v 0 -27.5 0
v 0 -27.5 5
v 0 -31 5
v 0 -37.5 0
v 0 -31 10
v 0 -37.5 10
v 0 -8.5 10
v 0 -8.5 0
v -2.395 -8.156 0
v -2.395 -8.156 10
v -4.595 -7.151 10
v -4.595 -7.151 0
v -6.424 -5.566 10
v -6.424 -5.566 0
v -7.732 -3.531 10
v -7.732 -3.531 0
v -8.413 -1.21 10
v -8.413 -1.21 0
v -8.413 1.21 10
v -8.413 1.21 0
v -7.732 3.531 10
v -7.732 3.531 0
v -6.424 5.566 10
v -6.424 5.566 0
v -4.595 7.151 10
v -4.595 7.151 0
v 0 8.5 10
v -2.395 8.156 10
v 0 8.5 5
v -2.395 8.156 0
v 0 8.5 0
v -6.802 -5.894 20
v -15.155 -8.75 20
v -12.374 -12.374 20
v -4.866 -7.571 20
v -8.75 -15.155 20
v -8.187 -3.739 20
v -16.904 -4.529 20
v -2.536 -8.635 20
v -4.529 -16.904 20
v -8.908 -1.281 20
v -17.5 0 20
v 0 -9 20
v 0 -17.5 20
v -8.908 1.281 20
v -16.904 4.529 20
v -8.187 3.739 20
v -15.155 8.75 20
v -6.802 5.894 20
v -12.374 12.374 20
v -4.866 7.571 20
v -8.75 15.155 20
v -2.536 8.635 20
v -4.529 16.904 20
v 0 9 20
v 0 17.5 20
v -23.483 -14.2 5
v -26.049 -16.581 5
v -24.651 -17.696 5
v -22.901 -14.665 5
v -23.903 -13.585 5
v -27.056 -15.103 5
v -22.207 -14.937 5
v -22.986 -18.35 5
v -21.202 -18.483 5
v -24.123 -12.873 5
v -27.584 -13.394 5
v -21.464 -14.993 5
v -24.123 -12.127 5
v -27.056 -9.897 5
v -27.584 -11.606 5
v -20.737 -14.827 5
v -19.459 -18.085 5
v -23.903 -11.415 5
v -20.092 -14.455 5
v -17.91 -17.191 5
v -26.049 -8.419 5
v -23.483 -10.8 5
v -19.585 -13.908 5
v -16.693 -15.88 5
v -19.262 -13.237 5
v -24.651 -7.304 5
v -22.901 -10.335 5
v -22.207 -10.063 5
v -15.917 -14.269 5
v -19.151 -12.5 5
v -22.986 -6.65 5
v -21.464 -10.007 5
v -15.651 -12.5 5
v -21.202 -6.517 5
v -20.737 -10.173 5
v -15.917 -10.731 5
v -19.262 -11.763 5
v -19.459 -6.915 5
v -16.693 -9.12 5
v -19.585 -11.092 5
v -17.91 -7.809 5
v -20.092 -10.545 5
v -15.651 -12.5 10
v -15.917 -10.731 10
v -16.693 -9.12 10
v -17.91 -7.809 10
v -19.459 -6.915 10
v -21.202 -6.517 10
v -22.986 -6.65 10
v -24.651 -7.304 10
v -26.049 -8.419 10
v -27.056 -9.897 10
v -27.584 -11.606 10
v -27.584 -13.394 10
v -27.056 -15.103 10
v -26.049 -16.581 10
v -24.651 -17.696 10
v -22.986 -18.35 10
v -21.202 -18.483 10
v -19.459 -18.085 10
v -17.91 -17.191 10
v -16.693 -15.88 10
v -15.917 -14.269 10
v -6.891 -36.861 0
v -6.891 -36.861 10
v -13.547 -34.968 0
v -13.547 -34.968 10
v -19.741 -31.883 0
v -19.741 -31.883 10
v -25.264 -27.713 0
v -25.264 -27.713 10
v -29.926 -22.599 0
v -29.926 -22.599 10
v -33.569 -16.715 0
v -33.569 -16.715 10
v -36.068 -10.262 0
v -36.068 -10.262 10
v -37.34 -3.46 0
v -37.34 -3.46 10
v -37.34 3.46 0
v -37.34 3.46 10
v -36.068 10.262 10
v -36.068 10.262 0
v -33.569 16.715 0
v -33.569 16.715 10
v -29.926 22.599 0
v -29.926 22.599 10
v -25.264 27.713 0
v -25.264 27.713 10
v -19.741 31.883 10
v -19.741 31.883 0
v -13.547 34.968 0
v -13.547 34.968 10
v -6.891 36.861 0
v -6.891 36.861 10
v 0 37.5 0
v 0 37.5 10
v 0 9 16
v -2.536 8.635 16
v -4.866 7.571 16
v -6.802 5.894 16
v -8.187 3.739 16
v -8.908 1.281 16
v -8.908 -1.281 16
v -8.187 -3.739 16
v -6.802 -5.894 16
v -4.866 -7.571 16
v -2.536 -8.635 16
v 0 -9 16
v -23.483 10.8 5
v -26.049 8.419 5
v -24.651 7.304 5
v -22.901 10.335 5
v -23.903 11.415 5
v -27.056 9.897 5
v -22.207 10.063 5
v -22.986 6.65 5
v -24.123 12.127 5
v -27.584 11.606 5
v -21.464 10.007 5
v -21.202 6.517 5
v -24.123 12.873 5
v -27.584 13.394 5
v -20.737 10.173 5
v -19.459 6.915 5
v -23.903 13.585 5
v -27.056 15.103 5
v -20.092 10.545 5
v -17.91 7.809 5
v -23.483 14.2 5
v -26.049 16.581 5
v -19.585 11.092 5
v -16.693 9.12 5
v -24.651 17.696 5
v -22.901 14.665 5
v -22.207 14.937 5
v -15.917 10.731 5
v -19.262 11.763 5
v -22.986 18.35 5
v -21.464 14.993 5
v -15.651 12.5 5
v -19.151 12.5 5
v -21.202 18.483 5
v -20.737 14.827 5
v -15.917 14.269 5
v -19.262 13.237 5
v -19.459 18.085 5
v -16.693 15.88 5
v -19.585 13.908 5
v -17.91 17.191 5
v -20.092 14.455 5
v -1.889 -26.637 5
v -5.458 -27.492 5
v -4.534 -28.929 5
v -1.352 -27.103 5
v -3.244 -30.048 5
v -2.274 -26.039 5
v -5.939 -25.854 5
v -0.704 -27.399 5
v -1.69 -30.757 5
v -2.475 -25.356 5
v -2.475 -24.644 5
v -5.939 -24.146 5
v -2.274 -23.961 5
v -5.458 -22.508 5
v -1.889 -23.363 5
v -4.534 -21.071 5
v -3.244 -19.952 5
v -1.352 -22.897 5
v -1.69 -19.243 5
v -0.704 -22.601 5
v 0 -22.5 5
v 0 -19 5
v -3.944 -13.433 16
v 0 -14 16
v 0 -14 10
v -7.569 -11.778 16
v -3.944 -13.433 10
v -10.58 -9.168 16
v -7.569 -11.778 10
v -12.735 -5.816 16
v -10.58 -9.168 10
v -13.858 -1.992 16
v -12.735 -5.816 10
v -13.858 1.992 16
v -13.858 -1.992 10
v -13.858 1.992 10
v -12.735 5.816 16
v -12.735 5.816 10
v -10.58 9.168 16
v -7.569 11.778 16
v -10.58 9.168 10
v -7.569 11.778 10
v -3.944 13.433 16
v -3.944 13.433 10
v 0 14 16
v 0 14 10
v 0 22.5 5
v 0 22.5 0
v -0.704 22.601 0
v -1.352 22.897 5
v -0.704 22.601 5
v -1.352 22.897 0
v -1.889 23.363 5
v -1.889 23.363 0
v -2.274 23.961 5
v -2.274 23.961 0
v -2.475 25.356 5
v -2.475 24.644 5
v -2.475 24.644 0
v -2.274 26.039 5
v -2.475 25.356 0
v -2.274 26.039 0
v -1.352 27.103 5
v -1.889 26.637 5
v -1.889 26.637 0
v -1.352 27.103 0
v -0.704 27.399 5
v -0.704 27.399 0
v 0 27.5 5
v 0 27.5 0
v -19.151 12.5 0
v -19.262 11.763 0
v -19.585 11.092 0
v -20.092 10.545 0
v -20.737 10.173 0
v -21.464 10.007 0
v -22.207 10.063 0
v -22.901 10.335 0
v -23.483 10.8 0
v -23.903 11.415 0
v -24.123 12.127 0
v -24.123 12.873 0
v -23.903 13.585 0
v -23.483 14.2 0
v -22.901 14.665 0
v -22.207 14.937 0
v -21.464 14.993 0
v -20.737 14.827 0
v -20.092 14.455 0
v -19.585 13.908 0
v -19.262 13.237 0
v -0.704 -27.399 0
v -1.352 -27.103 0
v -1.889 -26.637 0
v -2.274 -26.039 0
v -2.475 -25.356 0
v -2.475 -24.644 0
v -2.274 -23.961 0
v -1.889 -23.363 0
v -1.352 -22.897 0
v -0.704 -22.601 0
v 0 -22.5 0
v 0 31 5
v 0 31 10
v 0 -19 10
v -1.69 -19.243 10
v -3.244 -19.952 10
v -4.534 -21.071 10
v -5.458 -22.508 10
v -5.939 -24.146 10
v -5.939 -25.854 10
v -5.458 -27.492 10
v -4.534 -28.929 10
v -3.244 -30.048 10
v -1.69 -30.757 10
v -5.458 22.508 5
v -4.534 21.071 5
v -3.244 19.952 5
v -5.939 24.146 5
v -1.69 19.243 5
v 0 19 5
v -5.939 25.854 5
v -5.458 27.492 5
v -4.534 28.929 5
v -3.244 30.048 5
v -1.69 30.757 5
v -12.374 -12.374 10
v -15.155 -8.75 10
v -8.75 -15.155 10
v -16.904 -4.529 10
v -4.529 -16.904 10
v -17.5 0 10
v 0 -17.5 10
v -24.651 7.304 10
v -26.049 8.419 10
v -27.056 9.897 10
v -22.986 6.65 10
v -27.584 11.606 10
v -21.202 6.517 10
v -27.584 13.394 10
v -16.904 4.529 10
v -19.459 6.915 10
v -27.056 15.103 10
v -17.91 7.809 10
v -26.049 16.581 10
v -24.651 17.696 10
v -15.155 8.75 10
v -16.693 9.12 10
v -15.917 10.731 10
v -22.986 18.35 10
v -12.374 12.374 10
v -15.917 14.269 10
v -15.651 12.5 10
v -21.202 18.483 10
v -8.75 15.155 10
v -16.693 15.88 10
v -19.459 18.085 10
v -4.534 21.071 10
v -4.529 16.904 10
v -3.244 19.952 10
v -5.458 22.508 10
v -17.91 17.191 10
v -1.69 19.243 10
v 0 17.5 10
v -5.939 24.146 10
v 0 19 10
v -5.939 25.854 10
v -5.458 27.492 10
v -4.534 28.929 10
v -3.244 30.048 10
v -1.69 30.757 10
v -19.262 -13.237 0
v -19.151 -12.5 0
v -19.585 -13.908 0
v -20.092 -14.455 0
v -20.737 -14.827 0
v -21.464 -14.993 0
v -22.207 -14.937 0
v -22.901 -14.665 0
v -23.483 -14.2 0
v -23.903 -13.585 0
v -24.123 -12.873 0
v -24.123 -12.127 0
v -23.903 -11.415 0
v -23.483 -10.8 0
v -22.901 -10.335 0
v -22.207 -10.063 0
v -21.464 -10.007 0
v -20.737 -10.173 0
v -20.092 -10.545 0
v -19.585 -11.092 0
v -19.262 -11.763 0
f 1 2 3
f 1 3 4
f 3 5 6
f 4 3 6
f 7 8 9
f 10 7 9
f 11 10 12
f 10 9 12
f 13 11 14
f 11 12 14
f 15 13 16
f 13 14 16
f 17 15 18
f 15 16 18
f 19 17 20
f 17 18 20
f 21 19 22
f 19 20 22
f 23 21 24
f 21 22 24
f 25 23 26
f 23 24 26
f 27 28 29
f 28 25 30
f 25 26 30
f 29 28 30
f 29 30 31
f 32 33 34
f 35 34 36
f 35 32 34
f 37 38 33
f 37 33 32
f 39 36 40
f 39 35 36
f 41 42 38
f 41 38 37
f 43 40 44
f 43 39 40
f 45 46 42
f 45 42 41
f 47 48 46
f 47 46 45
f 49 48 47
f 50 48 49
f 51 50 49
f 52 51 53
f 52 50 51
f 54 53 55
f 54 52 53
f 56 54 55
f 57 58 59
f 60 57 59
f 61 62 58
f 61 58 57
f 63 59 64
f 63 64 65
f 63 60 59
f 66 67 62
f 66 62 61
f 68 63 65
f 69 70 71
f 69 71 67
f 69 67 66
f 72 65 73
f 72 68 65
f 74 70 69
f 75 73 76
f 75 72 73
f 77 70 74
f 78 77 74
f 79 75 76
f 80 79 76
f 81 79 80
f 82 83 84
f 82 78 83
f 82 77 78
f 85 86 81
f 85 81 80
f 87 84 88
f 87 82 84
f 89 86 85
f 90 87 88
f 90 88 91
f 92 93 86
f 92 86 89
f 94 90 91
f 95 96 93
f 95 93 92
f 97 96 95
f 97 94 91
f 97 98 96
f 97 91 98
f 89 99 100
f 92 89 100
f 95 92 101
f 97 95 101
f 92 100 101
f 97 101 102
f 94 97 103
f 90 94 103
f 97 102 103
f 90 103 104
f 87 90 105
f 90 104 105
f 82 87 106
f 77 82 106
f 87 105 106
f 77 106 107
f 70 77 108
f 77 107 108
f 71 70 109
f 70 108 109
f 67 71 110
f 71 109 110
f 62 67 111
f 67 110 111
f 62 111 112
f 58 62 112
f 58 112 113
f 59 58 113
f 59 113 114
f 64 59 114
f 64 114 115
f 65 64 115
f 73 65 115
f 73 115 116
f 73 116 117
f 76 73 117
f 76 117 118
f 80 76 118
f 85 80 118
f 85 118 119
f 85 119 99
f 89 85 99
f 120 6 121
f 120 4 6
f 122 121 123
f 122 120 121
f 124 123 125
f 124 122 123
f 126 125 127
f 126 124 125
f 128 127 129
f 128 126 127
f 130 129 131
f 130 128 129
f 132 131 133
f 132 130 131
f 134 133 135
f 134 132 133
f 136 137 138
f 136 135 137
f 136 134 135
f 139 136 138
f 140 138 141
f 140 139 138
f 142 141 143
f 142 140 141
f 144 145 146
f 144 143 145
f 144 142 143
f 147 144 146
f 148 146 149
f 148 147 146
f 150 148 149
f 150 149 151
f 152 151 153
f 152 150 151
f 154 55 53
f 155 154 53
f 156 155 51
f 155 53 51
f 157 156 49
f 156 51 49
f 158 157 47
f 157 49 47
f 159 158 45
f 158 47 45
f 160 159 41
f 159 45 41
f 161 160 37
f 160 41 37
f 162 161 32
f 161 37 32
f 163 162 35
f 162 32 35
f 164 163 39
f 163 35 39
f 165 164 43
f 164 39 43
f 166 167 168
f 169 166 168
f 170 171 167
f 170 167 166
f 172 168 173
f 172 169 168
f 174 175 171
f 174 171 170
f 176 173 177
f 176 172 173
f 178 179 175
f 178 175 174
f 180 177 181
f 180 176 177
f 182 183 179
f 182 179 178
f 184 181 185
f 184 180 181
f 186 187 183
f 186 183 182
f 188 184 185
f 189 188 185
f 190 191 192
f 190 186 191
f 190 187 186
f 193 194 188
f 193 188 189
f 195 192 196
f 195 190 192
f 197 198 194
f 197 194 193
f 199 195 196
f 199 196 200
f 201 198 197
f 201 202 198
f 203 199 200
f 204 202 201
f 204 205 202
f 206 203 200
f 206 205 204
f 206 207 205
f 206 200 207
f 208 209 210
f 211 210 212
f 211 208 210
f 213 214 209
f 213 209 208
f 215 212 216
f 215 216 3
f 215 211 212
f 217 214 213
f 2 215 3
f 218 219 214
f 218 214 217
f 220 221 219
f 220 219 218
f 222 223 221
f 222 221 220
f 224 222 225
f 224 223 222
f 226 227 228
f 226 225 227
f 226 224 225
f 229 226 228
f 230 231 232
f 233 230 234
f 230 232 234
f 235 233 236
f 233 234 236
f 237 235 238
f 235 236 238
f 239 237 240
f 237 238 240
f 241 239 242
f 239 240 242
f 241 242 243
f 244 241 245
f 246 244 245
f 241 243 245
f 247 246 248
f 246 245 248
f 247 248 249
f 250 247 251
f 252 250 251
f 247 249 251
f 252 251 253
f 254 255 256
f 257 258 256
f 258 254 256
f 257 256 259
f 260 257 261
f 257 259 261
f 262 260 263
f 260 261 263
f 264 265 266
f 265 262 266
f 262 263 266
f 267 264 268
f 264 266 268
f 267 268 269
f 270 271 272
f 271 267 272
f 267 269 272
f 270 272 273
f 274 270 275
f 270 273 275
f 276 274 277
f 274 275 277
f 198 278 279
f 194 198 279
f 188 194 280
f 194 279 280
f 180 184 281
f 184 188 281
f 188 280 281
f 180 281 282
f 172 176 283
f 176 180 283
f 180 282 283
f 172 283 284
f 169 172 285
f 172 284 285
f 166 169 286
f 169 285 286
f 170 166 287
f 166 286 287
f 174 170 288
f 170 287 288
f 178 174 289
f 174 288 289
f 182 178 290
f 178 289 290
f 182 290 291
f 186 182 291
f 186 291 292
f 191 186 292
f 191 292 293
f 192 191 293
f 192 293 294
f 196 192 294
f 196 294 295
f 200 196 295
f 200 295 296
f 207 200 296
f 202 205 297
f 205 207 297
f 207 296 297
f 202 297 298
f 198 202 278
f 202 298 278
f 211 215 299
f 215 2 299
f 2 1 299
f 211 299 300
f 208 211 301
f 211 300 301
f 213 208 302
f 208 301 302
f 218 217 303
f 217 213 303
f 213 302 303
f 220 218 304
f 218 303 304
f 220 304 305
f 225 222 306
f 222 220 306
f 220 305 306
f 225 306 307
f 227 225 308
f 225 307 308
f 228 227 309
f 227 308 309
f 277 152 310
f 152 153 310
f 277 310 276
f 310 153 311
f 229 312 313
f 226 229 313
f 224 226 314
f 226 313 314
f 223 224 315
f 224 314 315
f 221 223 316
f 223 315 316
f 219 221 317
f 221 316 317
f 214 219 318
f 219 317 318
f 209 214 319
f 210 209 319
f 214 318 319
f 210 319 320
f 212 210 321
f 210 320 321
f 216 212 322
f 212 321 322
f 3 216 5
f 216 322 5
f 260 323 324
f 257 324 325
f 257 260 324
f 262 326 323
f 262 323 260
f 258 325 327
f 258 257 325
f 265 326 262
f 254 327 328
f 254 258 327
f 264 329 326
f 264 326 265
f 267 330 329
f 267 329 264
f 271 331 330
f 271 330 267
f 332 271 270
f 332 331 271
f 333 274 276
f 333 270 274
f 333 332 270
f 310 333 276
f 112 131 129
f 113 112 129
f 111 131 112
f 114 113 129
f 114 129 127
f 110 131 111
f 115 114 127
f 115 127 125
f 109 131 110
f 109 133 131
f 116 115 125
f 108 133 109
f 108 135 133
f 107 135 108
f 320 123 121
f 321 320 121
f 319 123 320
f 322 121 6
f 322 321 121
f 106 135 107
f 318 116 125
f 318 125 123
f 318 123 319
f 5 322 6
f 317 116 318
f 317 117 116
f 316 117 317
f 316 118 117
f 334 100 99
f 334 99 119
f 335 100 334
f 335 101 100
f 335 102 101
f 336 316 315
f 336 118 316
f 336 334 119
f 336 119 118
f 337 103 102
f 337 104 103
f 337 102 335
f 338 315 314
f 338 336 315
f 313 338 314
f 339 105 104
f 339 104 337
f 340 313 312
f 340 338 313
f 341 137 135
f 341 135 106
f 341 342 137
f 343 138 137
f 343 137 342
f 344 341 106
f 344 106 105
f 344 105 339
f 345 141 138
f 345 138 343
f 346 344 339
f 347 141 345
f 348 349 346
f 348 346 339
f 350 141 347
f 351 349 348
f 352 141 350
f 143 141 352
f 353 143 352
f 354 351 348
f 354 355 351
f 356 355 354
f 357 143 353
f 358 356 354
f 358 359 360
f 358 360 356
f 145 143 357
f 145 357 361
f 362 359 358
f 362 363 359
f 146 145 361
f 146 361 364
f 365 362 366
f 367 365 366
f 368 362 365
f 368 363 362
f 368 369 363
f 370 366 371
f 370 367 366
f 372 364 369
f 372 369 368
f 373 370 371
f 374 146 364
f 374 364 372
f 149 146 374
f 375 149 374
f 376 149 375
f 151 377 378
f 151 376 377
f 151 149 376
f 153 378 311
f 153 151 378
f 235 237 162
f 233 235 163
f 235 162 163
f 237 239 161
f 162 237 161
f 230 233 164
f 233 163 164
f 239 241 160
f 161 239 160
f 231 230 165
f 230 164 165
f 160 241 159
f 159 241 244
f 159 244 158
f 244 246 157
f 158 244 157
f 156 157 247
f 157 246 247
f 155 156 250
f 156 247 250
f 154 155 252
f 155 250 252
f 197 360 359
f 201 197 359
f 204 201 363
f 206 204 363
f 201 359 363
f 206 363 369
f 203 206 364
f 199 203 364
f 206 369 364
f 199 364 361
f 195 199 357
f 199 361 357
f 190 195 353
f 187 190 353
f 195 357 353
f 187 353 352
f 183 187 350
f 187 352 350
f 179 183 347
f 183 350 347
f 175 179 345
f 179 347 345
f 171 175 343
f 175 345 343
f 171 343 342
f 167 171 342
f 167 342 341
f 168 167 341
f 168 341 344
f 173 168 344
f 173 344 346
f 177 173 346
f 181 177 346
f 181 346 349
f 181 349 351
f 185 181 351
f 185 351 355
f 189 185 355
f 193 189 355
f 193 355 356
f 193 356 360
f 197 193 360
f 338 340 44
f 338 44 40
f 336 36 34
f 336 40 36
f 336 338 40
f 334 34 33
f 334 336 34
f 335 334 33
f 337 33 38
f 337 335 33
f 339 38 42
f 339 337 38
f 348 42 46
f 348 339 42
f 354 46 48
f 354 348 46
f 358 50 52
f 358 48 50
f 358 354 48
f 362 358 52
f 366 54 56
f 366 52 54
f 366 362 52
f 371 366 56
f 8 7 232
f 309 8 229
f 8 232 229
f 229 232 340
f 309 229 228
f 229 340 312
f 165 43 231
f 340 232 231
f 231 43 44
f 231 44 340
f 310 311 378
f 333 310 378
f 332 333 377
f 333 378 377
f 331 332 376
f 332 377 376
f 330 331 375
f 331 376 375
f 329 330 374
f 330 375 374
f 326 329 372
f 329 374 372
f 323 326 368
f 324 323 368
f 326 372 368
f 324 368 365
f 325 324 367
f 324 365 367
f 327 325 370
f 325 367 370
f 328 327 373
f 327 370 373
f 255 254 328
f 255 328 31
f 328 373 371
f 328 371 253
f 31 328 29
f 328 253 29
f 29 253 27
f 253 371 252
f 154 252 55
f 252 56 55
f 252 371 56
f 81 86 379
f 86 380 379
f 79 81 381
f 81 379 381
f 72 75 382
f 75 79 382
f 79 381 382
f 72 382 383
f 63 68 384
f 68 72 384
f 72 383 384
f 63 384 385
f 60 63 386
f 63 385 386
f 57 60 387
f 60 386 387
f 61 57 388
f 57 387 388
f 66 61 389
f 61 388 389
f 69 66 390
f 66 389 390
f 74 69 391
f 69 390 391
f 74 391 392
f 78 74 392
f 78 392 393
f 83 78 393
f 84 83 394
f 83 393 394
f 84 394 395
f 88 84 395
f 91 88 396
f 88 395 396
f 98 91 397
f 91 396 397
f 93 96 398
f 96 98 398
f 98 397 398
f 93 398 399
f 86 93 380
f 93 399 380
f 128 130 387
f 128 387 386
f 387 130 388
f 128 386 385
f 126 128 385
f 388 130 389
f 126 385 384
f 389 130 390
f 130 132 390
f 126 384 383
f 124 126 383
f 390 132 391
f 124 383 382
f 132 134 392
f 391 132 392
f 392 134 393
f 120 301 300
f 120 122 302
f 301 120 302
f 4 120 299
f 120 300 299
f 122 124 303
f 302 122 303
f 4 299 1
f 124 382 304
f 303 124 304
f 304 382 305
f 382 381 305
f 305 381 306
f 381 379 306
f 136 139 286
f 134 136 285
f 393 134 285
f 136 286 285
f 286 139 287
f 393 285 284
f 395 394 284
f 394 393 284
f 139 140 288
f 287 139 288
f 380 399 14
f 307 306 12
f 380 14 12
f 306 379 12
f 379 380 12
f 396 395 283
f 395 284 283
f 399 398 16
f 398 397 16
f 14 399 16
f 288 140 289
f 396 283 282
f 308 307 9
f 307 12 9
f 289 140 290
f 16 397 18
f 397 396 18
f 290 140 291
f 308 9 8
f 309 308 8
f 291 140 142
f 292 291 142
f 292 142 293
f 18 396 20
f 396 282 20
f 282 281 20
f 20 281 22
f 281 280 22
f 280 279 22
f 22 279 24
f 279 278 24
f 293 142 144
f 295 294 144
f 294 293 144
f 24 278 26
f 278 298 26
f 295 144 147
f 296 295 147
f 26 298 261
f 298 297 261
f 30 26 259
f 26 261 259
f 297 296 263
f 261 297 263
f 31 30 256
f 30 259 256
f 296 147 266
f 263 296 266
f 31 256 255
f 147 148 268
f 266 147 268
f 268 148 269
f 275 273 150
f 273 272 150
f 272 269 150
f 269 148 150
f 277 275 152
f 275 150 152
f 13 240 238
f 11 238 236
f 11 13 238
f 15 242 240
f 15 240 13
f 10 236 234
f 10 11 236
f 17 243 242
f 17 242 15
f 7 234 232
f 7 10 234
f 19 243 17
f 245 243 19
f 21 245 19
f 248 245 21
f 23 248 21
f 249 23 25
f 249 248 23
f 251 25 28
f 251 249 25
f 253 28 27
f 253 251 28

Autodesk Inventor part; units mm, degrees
ref_plane "YZ Plane" through (0, 0, 0) normal (1, 0, 0) x (0, 1, 0)
ref_plane "XZ Plane" through (0, 0, 0) normal (0, 1, 0) x (-1, 0, 0)
ref_plane "XY Plane" through (0, 0, 0) normal (0, 0, 1) x (1, 0, 0)
sketch "Sketch1" plane through (0, 0, 0) normal (0, 0, 1) x (1, 0, 0)
  circle A0 centre (0, 0) radius 37.5
  circle A1 centre (0, 25) radius 2.5
  circle A2 centre (0, 0) radius 25 construction
  circle A3 centre (-21.6506, 12.5) radius 2.5
  circle A4 centre (-21.6506, -12.5) radius 2.5
  circle A5 centre (0, -25) radius 2.5
  circle A6 centre (21.6506, -12.5) radius 2.5
  circle A7 centre (21.6506, 12.5) radius 2.5
  circle A8 centre (0, 0) radius 2.5
  dimension "d2" = 50
  dimension "d0" = 75
  dimension "d1" = 5
  dimension "d5" = 360
  dimension "d7" = 5
extrude "Extrusion1" add sketch "Sketch1" along normal blind 10
sketch "Sketch4" plane through (0, 0, 10) normal (0, 0, 1) x (1, 0, 0)
  circle A0 centre (0, 0) radius 2.5 projected
  circle A1 centre (21.6506, 12.5) radius 2.5 projected
  circle A2 centre (21.6506, -12.5) radius 2.5 projected
  circle A3 centre (0, -25) radius 2.5 projected
  circle A4 centre (-21.6506, -12.5) radius 2.5 projected
  circle A5 centre (-21.6506, 12.5) radius 2.5 projected
  circle A6 centre (0, 25) radius 2.5 projected
  circle A7 centre (0, 0) radius 37.5 projected
  circle A8 centre (0, 25) radius 6
  circle A9 centre (-21.6506, 12.5) radius 6
  circle A10 centre (-21.6506, -12.5) radius 6
  circle A11 centre (0, -25) radius 6
  circle A12 centre (21.6506, -12.5) radius 6
  circle A13 centre (21.6506, 12.5) radius 6
  dimension "d17" = 12
  dimension "d20" = 360
extrude "Extrusion4" cut sketch "Sketch4" against normal blind 5 contours A8 | A9 | A10 | A11 | A12 | A13
sketch "Sketch5" plane through (0, 0, 0) normal (0, 0, -1) x (-1, 0, 0)
  circle A0 centre (0, 0) radius 2.5 projected
  circle A1 centre (0, 0) radius 8.5
  dimension "d24" = 17
extrude "Extrusion5" cut sketch "Sketch5" against normal blind 5
sketch "Sketch6" plane through (0, 0, 10) normal (0, 0, 1) x (1, 0, 0)
  circle A0 centre (0, 0) radius 2.5 projected
  circle A1 centre (0, 0) radius 14
  circle A2 centre (0, 0) radius 17.5
  dimension "d35" = 35
  dimension "d36" = 28
extrude "Extrusion6" add sketch "Sketch6" along normal blind 10 contours A2
sketch "Sketch7" plane through (0, 0, 20) normal (0, 0, 1) x (1, 0, 0)
  circle A0 centre (0, 0) radius 9
  circle A1 centre (0, 0) radius 2.5
  circle A2 centre (0, 0) radius 17.5
  circle A3 centre (0, 0) radius 17.5 projected
  dimension "d40" = 18
extrude "Extrusion7" add sketch "Sketch7" against normal blind 4 contours A2
sketch "Sketch8" plane through (0, 0, 20) normal (0, 0, 1) x (1, 0, 0)
  circle A0 centre (0, 0) radius 37.5 projected
  line L0 (0, -37.5) -> (37.5, -37.5)
  line L1 (37.5, -37.5) -> (37.5, 37.5)
  line L2 (37.5, 37.5) -> (0, 37.5)
  line L3 (0, 37.5) -> (0, -37.5)
  point P0 (37.5, 0)
extrude "Extrusion8" cut sketch "Sketch8" against normal through all contours A0 L3 | L1 L0 A0 | A0 L2 L1 picked at (9.7729, 7.7936)
sketch "Sketch9" plane through (0, 0, 5) normal (0, 0, -1) x (-1, 0, 0)
  arc A0 (0, 14) -> (0, -14) centre (0, 0) ccw projected
  circle A1 centre (0, 0) radius 8.5 construction
  arc A2 (0, -14) -> (0, 14) centre (0, 0) ccw projected
  line L0 (0, 14) -> (-0.0015, 8.5)
  line L1 (0, -14) -> (0, -8.5)
  line L2 (0, -9) -> (0, -14) projected
  arc A3 (0, -8.5) -> (-0.0015, 8.5) centre (0, 0) ccw
  line L3 (0, 8.5) -> (0, 2.5) projected
  dimension "d39" = 17
extrude "Extrusion9" cut sketch "Sketch9" against normal blind 5 contours L0 A3 L1 A0
properties part number "BA008" material "ABS Plastic"
